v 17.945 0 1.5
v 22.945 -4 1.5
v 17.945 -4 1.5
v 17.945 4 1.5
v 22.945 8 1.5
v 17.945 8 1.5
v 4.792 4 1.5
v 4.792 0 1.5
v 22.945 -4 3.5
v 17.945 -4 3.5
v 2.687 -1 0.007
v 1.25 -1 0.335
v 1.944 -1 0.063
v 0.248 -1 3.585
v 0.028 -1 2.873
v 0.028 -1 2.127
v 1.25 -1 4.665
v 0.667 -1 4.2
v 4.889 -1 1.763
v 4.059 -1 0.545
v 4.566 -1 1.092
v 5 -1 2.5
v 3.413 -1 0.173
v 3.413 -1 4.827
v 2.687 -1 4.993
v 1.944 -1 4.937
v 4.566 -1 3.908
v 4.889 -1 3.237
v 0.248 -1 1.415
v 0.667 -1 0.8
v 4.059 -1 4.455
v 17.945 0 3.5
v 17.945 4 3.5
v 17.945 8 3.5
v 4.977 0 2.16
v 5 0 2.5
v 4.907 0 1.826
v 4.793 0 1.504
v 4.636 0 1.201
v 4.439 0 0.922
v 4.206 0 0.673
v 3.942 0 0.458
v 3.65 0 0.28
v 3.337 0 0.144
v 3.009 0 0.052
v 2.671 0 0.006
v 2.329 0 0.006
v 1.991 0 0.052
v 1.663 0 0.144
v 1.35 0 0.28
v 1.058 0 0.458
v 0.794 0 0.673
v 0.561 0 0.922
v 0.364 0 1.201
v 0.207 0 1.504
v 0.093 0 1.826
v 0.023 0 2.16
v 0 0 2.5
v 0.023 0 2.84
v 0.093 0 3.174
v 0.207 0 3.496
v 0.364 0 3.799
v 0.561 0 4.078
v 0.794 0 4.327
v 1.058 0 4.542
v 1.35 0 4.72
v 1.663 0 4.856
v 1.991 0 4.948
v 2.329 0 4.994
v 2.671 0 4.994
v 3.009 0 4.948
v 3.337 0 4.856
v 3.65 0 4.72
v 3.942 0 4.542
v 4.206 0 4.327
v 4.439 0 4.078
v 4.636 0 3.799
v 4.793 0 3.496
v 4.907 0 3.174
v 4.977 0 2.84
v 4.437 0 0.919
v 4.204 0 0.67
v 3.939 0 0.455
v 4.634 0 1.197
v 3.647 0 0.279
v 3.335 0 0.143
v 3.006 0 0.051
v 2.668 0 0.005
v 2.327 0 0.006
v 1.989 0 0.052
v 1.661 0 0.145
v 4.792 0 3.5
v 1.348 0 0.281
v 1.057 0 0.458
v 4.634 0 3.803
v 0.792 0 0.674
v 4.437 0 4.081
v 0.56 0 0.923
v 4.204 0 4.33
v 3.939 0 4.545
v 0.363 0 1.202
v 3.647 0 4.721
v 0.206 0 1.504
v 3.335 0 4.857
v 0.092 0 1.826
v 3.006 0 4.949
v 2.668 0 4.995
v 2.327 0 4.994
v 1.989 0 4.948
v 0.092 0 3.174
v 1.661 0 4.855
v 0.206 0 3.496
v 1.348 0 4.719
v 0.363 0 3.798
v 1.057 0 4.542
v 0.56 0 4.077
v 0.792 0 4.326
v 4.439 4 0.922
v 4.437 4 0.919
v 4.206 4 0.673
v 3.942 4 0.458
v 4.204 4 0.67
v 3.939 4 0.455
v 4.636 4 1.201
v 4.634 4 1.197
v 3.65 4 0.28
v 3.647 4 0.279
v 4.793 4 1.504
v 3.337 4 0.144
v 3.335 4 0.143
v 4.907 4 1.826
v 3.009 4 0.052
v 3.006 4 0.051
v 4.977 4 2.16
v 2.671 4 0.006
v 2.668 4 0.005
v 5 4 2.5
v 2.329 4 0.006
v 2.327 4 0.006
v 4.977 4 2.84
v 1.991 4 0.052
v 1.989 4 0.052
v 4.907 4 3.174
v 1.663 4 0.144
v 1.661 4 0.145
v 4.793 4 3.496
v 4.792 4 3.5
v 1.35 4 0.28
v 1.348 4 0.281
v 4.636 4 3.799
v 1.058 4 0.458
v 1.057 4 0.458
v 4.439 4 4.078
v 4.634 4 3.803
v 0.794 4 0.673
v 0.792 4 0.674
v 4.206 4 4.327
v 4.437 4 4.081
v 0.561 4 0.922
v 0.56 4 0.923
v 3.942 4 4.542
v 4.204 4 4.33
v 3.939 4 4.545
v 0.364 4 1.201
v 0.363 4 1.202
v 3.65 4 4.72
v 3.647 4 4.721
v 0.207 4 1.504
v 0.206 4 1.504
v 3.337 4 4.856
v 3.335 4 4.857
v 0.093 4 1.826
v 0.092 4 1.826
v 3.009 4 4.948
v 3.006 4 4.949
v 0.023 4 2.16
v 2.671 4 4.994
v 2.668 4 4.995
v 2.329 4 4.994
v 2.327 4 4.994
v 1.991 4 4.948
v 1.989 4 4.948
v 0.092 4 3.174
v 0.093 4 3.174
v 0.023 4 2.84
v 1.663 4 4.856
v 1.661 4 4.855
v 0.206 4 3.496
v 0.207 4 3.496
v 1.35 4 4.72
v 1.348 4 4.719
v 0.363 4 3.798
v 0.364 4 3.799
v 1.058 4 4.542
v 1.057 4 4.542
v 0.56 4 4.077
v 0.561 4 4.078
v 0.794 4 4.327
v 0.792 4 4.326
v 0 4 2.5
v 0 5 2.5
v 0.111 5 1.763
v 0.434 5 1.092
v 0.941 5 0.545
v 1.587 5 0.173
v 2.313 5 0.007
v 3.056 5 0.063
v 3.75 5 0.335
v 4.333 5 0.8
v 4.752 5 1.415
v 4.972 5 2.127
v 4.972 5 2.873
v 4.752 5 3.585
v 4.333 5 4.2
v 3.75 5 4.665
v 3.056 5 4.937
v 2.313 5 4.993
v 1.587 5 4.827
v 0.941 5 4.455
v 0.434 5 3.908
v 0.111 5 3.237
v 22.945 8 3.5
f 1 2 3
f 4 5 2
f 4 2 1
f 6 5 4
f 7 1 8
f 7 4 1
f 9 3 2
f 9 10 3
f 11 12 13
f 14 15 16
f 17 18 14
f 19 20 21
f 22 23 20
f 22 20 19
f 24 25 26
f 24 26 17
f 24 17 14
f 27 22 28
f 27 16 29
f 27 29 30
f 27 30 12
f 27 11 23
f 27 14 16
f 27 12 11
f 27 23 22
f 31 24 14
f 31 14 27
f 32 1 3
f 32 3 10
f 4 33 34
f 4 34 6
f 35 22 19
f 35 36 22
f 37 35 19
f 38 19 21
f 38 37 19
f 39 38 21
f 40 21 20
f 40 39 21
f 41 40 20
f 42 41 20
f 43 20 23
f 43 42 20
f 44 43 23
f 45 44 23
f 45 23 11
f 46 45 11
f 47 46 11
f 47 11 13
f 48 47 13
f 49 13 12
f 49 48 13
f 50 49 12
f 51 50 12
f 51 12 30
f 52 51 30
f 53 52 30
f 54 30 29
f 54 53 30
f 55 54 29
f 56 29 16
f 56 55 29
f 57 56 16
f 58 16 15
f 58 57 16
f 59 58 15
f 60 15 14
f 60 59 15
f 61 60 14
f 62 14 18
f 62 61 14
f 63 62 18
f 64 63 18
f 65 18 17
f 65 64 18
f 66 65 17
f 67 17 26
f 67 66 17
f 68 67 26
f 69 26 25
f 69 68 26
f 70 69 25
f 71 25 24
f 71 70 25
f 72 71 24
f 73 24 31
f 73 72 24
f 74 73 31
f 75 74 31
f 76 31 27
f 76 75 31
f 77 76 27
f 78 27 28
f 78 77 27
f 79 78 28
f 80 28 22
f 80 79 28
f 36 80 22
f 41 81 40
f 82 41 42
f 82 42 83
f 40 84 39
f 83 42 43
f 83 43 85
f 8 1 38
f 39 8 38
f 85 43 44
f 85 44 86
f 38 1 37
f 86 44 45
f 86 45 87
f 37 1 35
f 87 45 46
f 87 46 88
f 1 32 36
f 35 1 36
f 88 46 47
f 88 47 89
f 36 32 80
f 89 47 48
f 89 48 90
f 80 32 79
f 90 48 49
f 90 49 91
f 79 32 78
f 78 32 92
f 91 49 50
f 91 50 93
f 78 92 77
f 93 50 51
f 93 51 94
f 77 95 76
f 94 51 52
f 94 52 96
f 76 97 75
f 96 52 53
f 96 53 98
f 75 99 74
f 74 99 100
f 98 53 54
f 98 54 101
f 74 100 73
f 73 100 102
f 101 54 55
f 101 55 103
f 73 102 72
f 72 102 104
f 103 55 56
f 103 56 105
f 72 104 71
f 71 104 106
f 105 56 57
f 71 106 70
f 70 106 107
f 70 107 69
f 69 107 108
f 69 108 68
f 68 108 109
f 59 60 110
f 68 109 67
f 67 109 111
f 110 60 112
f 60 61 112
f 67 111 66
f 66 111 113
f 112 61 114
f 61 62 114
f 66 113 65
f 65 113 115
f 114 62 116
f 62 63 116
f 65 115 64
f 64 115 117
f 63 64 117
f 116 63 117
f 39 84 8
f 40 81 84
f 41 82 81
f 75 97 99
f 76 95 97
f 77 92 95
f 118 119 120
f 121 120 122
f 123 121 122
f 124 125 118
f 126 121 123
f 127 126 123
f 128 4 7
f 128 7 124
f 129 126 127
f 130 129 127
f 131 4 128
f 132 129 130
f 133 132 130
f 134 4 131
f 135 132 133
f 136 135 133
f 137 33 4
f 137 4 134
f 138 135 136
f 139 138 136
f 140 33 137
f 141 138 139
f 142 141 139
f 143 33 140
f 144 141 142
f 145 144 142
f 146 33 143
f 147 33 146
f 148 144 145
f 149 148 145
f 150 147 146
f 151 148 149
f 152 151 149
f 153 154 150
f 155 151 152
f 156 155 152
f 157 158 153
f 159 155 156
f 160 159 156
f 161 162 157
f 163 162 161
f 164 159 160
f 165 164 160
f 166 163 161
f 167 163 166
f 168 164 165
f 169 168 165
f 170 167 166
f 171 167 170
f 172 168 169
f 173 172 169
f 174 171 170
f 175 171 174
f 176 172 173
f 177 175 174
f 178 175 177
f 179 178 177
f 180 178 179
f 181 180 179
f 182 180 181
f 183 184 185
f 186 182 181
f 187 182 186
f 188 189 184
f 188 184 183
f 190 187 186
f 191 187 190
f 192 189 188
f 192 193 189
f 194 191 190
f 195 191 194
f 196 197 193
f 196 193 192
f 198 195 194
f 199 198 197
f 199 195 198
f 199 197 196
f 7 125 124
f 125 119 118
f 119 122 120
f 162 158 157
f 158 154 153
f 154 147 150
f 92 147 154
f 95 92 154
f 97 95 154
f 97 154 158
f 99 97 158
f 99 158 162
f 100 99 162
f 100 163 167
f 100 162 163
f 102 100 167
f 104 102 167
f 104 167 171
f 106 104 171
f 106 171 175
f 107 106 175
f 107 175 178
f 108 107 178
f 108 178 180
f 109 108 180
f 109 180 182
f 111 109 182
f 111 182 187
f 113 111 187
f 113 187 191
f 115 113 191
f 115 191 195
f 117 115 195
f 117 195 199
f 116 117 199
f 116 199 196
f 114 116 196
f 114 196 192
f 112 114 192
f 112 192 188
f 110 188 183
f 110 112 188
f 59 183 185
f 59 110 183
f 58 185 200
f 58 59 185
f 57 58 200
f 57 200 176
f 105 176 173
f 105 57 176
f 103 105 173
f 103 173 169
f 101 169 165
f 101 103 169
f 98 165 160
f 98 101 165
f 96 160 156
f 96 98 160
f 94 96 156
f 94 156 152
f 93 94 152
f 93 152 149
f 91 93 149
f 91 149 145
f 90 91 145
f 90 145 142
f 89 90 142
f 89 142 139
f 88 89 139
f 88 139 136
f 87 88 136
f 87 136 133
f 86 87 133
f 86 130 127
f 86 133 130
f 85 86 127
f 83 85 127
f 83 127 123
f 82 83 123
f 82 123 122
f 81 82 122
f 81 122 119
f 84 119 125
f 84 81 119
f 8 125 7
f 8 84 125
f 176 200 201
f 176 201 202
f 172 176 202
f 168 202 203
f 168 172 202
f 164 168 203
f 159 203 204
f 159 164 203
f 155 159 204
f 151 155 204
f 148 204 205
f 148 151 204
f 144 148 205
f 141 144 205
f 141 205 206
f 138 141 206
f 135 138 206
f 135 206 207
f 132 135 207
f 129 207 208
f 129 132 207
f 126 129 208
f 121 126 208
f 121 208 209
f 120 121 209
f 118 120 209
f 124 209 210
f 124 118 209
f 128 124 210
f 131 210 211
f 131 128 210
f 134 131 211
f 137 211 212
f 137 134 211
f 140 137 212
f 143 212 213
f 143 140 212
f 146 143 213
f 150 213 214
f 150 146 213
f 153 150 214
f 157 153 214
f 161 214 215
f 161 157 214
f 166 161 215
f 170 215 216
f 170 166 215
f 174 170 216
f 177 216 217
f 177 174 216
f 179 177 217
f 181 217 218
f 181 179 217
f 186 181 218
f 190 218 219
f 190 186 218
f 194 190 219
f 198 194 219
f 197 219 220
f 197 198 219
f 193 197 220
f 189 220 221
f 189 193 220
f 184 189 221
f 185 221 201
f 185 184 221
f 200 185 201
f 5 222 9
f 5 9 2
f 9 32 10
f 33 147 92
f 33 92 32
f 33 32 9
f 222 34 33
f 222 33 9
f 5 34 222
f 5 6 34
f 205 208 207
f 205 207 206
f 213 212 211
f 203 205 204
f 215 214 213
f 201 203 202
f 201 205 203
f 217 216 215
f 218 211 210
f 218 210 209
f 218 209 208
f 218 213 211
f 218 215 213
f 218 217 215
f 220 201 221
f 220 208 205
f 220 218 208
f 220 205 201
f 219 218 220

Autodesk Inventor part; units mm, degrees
ref_plane "YZ Plane" through (0, 0, 0) normal (1, 0, 0) x (0, 1, 0)
ref_plane "XZ Plane" through (0, 0, 0) normal (0, 1, 0) x (-1, 0, 0)
ref_plane "XY Plane" through (0, 0, 0) normal (0, 0, 1) x (1, 0, 0)
sketch "Sketch1" plane through (0, 0, 0) normal (0, 1, 0) x (-1, 0, 0)
  line L0 (-22.9447, 5) -> (-22.9447, 0)
  line L1 (-22.9447, 0) -> (-8, 0)
  line L2 (-8, 0) -> (-8, 1.5)
  line L3 (-8, 1.5) -> (-4.7916, 1.5)
  line L4 (-8, 5) -> (-8, 3.5)
  line L5 (-8, 3.5) -> (-4.7916, 3.5)
  line L6 (-8, 5) -> (-22.9447, 5)
  arc A0 (-4.7916, 1.5) -> (-4.7916, 3.5) centre (-2.5, 2.5) ccw
  point P0 (0, 5)
  dimension "d1" = 5
  dimension "d2" = 1.5
  dimension "d3" = 1.5
extrude "Extrusion1" add sketch "Sketch1" along normal blind 4
sketch "Sketch6" plane through (8, 0, 0) normal (0, 0, -1) x (1, 0, 0)
  line L0 (0, 0) -> (0, -4) projected
  line L1 (0, -4) -> (14.9617, -4)
  line L2 (14.9617, -4) -> (14.9617, 1)
  line L3 (14.9617, 1) -> (0, 1)
  line L4 (0, 1) -> (0, -4)
  point P0 (-8, 0)
extrude "Extrusion2" cut sketch "Sketch6" against normal blind 1.5
sketch "Sketch7" plane through (0, 4, 0) normal (0, 1, 0) x (-1, 0, 0)
  circle A0 centre (-2.5, 2.5) radius 2.5
  point P0 (0, 0)
  dimension "d8" = 5
extrude "Extrusion3" add sketch "Sketch7" along normal blind 1
sketch "Sketch8" plane through (0, 0, 0) normal (0, -1, 0) x (1, 0, 0)
  circle A0 centre (2.5, 2.5) radius 2.5
  point P0 (0, 0)
  dimension "d11" = 5
extrude "Extrusion4" add sketch "Sketch8" along normal blind 1
sketch "Sketch9" plane through (8, 0, 5) normal (0, 0, 1) x (1, 0, 0)
  line L0 (-3.2084, 0) -> (14.9447, 0) projected
  line L1 (-0.1278, 4) -> (14.9447, 4)
  line L2 (14.9447, 4) -> (14.9447, 0)
  line L3 (14.9447, 0) -> (-0.1278, 0)
  line L4 (-0.1278, 0) -> (-0.1278, 4)
  point P0 (-8, 0)
extrude "Extrusion5" cut sketch "Sketch9" against normal blind 1.5
sketch "Sketch10" plane through (0, 4, 0) normal (0, 1, 0) x (1, 0, 0)
  line L0 (22.9447, -1.5) -> (22.9447, -3.5) projected
  line L1 (4.7916, -1.5) -> (22.9447, -1.5) projected
  line L2 (22.9447, -3.5) -> (17.9447, -3.5)
  line L3 (17.9447, -3.5) -> (17.9447, -1.5)
  line L4 (17.9447, -1.5) -> (22.9447, -1.5)
  line L5 (22.9447, -1.5) -> (22.9447, -3.5)
  point P0 (0, 0)
  dimension "d16" = 5
extrude "Extrusion6" add sketch "Sketch10" along normal blind 4
sketch "Sketch11" plane through (0, 0, 0) normal (0, -1, 0) x (1, 0, 0)
  line L0 (22.9447, 1.5) -> (17.9447, 1.5) projected
  line L1 (17.9447, 3.5) -> (22.9447, 3.5) projected
  line L2 (22.9447, 1.5) -> (17.9447, 1.5)
  line L3 (17.9447, 1.5) -> (17.9447, 3.5)
  line L4 (17.9447, 3.5) -> (22.9447, 3.5)
  line L5 (22.9447, 3.5) -> (22.9447, 1.5)
  point P0 (0, 0)
extrude "Extrusion7" add sketch "Sketch11" along normal blind 4
properties part number "button_press_new"
